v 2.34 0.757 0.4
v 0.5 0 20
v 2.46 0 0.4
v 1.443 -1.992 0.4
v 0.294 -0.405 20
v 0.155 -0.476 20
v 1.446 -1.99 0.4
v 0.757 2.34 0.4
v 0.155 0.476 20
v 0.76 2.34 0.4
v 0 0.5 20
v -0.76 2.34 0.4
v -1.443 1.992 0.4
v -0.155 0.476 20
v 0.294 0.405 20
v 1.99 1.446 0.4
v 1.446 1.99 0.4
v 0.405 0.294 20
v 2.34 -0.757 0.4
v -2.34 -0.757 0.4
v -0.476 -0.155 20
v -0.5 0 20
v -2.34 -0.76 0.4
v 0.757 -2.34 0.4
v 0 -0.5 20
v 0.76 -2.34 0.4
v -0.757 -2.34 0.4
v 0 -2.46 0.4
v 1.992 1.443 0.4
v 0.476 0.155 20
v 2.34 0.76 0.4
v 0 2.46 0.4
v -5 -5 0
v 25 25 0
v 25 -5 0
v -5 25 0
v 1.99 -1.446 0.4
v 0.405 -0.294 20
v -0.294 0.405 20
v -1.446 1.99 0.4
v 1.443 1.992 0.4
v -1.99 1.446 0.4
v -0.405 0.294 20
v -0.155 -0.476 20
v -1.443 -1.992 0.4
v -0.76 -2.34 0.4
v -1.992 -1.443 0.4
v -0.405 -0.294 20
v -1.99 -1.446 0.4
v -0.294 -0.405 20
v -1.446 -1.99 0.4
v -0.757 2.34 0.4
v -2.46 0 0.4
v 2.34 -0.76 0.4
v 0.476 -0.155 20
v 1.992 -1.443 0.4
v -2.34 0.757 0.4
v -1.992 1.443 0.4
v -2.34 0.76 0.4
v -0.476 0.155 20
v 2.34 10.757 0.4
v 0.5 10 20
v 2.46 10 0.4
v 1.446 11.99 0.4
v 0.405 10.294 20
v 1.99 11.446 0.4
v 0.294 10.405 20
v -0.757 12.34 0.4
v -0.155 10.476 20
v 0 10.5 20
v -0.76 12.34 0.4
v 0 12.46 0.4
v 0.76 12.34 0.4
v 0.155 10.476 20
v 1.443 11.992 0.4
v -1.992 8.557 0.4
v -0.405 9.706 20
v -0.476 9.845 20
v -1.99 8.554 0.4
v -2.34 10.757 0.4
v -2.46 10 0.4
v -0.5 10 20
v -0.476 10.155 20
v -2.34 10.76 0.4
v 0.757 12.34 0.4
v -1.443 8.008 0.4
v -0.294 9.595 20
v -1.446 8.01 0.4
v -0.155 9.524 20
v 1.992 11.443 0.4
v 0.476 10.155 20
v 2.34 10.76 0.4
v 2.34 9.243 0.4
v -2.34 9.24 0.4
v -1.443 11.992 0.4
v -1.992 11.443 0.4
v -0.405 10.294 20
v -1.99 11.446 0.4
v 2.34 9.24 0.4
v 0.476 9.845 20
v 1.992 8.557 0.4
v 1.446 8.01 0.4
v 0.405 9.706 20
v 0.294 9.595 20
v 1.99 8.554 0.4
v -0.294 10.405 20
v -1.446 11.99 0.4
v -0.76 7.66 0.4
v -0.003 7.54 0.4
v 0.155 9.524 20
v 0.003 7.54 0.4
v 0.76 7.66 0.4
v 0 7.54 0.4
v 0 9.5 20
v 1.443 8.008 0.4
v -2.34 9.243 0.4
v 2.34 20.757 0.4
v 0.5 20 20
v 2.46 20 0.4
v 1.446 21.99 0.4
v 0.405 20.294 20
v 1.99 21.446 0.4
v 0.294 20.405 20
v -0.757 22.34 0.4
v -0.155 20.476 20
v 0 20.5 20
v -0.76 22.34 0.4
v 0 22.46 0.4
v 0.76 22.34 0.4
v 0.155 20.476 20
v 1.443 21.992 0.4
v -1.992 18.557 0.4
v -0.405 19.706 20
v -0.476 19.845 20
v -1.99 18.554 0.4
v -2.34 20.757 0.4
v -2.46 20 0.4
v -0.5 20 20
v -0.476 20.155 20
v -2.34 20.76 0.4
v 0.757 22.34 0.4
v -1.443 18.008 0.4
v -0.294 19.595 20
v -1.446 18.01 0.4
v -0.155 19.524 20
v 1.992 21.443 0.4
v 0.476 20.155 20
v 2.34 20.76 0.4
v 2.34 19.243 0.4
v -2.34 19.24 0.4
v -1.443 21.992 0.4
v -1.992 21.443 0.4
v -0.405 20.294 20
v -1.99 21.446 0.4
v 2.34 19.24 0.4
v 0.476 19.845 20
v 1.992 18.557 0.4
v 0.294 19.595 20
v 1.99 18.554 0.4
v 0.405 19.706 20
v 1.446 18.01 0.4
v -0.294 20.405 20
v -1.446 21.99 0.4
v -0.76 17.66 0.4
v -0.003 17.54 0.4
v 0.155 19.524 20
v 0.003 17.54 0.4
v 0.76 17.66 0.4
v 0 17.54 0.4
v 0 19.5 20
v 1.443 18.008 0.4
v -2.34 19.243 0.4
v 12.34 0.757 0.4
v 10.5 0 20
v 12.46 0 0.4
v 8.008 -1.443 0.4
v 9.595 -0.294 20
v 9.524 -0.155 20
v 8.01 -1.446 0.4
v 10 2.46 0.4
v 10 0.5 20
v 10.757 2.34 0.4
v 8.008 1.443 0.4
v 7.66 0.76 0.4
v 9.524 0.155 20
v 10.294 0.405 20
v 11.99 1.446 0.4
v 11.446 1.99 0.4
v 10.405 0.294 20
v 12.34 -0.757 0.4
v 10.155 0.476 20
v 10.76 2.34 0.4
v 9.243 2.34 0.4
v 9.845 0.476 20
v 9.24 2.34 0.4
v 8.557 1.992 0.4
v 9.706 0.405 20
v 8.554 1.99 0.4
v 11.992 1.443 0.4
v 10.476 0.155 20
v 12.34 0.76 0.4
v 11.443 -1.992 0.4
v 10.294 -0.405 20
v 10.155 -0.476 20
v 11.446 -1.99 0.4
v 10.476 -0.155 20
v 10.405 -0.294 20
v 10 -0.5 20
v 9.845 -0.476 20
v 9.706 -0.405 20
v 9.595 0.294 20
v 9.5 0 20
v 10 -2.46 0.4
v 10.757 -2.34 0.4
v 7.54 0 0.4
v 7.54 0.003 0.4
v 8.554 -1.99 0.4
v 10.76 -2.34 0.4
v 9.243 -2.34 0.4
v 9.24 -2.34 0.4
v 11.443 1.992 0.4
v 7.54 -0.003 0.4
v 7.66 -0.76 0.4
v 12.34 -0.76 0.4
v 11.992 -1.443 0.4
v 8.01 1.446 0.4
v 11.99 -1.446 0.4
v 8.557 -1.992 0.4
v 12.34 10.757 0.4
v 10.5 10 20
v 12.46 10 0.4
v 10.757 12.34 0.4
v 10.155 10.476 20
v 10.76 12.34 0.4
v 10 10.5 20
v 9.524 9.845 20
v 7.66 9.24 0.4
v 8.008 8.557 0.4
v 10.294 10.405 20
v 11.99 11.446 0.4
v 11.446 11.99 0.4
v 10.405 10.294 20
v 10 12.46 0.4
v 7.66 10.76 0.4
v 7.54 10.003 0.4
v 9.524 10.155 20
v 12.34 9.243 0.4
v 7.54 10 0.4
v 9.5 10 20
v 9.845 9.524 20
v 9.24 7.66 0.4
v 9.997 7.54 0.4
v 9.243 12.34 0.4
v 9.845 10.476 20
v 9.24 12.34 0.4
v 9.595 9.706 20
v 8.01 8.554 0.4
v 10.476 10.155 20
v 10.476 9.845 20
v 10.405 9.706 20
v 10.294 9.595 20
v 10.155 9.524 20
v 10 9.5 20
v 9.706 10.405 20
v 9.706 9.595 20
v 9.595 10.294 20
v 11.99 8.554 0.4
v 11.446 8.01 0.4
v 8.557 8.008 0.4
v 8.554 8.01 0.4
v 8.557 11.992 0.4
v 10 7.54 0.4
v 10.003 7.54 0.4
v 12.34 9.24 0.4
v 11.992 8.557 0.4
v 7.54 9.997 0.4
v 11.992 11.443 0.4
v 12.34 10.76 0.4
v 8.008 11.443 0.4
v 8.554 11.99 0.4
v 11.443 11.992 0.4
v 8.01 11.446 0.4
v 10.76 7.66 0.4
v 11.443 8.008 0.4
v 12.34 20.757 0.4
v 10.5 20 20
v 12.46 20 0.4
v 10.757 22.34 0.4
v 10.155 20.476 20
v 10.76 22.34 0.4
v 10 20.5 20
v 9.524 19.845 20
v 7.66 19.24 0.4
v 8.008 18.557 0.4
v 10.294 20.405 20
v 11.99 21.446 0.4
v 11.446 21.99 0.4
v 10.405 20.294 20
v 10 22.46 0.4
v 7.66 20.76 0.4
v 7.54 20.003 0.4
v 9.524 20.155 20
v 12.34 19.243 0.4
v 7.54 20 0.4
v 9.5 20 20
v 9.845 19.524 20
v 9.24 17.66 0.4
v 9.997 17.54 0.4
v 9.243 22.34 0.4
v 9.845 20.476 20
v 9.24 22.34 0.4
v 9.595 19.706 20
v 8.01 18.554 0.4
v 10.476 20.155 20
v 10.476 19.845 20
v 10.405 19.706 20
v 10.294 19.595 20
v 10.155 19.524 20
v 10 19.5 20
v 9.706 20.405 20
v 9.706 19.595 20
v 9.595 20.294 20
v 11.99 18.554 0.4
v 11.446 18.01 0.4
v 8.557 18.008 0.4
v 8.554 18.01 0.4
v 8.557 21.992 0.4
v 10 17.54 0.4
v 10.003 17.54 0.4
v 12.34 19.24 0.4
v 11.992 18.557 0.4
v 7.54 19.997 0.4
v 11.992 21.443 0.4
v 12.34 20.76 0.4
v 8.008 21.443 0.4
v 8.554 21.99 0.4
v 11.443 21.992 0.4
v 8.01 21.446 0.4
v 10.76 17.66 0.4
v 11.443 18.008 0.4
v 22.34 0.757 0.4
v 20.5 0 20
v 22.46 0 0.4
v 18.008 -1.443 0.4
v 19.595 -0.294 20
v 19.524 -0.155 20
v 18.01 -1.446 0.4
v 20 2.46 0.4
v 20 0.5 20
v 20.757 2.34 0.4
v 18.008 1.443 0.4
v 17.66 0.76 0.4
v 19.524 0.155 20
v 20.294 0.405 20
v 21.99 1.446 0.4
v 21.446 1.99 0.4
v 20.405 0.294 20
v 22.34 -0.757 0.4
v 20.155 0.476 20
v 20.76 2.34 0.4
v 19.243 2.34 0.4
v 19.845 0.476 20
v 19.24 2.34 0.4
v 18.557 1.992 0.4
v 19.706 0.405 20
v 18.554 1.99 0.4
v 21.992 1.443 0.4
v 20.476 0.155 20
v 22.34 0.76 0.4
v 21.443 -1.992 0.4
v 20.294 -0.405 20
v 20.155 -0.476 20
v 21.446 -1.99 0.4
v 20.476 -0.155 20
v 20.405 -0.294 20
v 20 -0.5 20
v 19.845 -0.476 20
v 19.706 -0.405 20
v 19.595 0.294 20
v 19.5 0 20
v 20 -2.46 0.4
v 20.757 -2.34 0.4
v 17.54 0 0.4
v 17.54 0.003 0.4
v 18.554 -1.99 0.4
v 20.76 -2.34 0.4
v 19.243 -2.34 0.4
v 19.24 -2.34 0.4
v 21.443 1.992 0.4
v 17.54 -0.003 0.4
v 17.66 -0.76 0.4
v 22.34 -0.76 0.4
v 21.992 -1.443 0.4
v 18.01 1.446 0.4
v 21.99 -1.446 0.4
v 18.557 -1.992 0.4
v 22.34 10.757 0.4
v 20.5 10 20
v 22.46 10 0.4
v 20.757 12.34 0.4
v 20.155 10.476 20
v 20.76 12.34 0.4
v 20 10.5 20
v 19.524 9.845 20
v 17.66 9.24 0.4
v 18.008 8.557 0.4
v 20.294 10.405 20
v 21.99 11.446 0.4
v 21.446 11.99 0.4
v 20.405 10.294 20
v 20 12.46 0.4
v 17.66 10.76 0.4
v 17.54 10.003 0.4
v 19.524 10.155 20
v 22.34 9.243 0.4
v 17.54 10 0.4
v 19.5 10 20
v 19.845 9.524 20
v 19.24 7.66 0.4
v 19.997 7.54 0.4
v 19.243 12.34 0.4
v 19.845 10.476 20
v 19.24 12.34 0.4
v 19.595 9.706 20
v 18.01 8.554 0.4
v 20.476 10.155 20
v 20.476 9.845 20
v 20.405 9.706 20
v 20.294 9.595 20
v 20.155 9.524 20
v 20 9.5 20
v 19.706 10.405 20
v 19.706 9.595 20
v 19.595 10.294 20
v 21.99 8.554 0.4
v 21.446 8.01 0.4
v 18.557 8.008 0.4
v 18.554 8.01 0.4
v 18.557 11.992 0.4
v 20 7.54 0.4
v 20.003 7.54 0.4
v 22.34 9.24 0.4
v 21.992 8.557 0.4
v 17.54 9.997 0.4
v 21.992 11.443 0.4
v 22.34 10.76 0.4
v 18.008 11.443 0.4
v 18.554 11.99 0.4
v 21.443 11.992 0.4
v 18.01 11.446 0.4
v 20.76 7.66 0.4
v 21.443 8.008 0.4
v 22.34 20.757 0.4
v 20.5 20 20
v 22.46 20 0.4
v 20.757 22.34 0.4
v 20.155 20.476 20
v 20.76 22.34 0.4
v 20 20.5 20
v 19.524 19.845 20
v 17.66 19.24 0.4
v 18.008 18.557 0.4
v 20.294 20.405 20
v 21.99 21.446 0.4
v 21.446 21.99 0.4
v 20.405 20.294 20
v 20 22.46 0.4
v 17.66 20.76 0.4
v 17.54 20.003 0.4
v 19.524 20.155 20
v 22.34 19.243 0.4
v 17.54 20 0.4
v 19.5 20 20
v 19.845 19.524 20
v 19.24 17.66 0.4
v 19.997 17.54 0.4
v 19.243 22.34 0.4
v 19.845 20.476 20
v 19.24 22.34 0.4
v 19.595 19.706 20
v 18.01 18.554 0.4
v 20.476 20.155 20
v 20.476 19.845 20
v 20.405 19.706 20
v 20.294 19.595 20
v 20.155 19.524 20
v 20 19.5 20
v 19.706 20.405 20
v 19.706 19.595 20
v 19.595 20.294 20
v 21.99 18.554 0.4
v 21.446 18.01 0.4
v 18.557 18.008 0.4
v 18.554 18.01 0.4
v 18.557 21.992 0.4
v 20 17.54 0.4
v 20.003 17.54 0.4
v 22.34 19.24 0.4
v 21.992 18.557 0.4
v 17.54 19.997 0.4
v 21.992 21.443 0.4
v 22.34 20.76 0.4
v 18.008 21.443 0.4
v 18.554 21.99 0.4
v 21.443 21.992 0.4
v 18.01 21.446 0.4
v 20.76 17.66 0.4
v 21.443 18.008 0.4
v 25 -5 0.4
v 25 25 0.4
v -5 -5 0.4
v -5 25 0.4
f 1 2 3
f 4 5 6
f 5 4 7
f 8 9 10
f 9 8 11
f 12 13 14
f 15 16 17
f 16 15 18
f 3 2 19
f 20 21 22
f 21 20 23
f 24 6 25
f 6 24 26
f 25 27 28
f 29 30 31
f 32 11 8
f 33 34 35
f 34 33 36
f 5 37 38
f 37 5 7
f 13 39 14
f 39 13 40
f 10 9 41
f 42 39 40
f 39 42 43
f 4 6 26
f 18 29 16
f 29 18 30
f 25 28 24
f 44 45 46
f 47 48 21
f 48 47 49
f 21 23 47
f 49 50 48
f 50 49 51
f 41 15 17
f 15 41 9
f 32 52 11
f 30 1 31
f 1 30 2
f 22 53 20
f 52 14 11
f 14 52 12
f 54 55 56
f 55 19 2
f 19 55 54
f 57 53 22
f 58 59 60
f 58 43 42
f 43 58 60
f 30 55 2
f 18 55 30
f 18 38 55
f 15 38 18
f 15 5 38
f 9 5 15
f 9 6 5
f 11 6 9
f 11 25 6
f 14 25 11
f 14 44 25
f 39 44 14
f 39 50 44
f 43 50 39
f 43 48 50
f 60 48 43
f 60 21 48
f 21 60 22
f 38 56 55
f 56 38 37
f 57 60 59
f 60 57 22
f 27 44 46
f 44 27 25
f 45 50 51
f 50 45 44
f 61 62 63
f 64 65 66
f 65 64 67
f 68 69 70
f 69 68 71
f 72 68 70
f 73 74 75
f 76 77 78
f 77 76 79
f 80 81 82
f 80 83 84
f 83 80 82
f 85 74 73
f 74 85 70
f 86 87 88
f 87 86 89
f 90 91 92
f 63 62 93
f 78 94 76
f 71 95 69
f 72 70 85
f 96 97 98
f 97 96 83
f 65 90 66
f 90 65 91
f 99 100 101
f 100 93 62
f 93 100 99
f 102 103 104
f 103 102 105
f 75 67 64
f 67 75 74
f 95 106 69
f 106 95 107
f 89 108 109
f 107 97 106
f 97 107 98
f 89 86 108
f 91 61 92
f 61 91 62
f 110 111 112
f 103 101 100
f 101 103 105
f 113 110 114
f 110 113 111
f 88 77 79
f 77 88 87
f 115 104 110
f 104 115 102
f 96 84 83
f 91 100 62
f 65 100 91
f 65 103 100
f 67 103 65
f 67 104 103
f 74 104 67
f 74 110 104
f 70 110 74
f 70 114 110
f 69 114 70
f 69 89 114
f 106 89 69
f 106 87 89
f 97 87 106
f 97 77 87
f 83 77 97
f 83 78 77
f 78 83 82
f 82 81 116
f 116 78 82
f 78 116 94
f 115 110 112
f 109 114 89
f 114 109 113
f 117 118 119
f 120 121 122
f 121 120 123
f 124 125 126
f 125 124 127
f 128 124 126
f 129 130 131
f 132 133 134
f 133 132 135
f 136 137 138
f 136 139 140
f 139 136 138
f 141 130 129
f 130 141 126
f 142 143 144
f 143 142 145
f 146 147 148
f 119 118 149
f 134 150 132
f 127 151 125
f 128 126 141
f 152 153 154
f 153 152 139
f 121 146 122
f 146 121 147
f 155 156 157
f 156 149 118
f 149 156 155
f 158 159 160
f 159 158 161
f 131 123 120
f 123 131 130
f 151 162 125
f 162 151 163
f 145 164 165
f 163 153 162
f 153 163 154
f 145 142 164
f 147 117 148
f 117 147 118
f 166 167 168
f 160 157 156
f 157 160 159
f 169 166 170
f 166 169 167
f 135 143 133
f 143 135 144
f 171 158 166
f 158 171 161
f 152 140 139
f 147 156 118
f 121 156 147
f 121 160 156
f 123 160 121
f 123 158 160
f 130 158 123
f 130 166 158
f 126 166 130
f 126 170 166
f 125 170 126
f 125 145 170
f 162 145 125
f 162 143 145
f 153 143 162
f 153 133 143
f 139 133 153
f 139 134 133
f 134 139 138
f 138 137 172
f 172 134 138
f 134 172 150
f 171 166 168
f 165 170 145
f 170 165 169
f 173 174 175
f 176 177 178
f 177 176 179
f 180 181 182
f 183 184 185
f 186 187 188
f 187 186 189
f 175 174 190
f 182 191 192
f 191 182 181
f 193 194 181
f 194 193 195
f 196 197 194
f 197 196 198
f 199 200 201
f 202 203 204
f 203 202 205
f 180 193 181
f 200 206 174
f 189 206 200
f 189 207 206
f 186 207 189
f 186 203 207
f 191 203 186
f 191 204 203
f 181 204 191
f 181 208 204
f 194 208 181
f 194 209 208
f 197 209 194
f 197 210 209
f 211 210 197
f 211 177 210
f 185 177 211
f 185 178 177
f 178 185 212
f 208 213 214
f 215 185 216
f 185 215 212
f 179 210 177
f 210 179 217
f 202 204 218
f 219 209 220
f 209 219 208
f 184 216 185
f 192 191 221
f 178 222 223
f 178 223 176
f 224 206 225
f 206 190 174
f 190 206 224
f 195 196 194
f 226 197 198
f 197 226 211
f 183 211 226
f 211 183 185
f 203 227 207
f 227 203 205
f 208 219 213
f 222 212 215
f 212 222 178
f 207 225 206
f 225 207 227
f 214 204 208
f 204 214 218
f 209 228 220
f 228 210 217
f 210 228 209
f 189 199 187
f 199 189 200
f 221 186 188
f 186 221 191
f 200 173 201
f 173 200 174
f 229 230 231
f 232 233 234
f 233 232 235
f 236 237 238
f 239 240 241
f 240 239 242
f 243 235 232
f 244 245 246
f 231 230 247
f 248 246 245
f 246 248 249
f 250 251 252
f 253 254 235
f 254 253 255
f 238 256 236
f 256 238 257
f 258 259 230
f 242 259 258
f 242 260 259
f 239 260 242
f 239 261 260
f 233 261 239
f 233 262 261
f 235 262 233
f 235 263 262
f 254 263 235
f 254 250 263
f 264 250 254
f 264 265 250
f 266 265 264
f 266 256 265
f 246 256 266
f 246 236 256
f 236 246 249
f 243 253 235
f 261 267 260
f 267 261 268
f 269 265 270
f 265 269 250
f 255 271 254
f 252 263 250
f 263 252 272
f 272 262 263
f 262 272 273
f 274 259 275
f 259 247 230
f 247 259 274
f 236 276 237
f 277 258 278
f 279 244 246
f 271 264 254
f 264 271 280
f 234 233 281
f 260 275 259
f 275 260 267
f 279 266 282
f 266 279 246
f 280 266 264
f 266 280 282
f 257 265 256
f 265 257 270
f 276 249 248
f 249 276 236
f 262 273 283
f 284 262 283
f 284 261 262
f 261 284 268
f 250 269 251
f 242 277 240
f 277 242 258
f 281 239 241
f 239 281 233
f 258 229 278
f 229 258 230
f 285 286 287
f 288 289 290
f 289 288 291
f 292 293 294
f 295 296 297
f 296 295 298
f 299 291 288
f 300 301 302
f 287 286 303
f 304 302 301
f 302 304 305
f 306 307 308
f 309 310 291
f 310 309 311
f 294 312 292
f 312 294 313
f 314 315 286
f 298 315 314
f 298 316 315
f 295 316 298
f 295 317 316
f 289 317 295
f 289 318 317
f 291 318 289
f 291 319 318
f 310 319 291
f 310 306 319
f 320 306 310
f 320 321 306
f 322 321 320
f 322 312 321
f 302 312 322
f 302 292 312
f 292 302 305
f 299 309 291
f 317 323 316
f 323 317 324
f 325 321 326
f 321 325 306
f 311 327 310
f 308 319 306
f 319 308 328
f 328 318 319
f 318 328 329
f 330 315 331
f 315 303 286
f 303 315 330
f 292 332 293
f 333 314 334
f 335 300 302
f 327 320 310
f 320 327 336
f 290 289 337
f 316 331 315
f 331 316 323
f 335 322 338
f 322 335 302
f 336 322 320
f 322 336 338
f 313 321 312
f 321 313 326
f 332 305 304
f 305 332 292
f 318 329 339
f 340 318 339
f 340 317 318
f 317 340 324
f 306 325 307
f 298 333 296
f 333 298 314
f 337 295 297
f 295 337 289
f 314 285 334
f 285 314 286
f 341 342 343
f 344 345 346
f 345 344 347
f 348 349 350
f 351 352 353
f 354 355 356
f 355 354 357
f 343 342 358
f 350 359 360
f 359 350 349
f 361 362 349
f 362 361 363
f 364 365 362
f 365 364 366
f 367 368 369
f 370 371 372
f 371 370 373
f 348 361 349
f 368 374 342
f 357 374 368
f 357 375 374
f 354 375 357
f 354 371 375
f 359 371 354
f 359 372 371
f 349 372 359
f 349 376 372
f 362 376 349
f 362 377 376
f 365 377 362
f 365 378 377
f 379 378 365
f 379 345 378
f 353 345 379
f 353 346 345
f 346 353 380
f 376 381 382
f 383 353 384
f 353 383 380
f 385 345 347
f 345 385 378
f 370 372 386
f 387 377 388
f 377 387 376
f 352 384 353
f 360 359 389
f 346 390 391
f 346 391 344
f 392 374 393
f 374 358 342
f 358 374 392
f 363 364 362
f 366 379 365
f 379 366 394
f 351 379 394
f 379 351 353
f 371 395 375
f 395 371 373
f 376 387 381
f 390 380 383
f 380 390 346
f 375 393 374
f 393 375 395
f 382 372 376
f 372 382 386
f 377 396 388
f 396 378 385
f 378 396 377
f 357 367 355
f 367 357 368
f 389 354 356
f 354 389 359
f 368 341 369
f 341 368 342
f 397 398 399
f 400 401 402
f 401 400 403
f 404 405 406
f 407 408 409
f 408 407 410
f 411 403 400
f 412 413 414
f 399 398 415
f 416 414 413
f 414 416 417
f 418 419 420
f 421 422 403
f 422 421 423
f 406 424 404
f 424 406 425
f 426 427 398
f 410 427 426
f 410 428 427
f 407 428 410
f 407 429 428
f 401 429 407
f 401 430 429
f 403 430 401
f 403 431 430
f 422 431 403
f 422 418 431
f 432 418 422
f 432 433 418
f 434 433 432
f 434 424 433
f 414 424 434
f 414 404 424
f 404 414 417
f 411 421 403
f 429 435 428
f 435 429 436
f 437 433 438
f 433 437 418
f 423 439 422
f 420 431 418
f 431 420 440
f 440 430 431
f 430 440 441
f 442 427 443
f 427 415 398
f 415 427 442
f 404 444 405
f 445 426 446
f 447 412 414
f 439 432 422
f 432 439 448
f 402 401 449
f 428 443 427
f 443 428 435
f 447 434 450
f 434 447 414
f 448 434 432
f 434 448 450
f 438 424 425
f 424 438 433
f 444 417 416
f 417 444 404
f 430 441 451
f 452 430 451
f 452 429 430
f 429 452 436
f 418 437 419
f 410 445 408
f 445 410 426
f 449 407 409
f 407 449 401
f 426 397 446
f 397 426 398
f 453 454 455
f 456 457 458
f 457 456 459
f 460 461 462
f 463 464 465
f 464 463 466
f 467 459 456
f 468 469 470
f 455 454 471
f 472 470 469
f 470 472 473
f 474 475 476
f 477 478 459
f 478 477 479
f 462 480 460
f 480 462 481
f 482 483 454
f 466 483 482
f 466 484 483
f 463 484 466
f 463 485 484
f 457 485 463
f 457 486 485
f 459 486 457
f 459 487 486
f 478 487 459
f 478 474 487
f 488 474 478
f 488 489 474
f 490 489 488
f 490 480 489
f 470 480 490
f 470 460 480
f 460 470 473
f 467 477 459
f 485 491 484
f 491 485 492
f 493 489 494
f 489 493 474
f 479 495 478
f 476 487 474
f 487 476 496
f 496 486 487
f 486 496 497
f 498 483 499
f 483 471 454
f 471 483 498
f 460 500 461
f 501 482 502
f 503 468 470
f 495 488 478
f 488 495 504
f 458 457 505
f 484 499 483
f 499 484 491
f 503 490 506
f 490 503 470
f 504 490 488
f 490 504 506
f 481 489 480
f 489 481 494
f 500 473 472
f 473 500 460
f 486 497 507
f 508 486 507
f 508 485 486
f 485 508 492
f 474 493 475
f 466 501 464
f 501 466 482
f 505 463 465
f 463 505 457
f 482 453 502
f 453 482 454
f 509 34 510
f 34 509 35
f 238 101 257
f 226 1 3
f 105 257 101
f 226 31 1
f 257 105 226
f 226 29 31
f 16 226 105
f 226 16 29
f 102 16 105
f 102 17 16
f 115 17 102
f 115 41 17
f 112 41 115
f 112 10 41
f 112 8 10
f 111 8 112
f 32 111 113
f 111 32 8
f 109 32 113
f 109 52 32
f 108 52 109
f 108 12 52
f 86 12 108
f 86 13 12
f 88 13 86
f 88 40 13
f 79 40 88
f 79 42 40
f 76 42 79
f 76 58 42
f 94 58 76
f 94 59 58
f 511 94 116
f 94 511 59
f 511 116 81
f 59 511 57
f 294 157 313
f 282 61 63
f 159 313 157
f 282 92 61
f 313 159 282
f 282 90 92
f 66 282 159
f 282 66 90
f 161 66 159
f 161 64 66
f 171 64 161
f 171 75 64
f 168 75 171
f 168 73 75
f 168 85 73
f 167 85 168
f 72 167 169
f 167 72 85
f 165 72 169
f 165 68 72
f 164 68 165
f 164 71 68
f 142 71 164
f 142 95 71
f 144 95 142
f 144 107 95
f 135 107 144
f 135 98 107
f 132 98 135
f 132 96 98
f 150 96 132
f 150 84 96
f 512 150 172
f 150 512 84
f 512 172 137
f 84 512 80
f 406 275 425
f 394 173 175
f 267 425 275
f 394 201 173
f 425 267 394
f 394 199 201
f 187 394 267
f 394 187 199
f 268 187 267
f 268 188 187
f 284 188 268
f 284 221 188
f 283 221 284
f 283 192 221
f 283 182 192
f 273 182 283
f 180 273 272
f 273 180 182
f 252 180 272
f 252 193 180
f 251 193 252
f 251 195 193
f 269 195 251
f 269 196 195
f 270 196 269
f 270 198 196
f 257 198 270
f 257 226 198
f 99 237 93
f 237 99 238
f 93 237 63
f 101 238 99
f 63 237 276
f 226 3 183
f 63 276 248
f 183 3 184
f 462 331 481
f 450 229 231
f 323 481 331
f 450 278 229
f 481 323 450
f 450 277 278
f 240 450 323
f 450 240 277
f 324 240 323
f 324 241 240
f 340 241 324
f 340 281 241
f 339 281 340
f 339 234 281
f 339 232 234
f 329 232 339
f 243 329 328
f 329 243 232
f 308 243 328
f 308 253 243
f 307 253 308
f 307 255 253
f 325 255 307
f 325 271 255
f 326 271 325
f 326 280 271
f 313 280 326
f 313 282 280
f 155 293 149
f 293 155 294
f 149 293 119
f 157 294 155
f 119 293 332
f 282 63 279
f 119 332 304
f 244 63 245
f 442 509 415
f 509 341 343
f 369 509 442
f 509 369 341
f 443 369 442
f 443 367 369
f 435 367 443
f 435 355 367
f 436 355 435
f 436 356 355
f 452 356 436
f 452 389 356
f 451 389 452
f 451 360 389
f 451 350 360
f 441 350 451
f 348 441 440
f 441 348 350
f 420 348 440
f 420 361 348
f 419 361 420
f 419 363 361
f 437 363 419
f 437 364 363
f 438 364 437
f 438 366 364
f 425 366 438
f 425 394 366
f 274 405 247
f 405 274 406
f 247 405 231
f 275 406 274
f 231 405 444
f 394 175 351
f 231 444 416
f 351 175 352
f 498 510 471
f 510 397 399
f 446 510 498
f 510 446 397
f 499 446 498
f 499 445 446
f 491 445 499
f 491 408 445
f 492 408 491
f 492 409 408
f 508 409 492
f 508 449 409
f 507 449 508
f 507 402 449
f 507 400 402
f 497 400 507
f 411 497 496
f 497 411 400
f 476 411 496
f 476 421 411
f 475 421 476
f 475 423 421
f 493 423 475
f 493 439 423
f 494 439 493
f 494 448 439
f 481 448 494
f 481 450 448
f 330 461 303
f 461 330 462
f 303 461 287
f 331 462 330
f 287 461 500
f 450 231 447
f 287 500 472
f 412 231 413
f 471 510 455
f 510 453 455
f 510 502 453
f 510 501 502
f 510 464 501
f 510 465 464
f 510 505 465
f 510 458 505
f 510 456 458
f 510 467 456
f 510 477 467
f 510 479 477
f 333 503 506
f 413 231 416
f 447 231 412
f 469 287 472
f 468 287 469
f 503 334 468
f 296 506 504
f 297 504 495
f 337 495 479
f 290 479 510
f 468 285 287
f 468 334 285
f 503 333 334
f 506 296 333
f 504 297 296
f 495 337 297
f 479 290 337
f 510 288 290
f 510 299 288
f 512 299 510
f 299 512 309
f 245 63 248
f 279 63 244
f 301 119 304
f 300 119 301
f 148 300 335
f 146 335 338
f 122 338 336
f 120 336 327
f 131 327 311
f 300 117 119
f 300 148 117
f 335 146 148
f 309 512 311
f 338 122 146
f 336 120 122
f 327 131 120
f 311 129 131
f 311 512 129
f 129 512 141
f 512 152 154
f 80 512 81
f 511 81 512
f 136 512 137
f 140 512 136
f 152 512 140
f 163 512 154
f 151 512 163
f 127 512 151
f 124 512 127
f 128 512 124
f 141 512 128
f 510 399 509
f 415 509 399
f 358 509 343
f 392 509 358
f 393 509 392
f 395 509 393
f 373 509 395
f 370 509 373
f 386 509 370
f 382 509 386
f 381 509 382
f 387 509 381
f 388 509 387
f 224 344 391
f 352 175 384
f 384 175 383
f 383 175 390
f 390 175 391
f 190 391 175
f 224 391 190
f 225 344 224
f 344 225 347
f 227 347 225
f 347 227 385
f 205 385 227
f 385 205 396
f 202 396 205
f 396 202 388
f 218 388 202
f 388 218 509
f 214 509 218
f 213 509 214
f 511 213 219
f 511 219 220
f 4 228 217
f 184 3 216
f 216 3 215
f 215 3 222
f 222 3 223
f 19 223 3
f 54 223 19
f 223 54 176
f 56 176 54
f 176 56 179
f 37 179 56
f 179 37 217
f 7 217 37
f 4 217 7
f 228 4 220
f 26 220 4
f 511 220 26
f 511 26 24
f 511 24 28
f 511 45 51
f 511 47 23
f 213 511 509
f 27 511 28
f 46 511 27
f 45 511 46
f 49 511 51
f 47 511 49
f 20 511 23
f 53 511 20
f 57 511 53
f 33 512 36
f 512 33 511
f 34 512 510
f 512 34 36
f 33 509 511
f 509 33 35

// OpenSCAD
$fn=20;
N=3;
M=3;
d=5;
space=10;

translate([-d, -d, 0])
  cube([N*space, M*space, 2*0.2]);

for(i=[0:N-1])
  for(j=[0:M-1])
    translate(space*[i, j, 0])
      cylinder(d1=d, d2=1, h=20);
